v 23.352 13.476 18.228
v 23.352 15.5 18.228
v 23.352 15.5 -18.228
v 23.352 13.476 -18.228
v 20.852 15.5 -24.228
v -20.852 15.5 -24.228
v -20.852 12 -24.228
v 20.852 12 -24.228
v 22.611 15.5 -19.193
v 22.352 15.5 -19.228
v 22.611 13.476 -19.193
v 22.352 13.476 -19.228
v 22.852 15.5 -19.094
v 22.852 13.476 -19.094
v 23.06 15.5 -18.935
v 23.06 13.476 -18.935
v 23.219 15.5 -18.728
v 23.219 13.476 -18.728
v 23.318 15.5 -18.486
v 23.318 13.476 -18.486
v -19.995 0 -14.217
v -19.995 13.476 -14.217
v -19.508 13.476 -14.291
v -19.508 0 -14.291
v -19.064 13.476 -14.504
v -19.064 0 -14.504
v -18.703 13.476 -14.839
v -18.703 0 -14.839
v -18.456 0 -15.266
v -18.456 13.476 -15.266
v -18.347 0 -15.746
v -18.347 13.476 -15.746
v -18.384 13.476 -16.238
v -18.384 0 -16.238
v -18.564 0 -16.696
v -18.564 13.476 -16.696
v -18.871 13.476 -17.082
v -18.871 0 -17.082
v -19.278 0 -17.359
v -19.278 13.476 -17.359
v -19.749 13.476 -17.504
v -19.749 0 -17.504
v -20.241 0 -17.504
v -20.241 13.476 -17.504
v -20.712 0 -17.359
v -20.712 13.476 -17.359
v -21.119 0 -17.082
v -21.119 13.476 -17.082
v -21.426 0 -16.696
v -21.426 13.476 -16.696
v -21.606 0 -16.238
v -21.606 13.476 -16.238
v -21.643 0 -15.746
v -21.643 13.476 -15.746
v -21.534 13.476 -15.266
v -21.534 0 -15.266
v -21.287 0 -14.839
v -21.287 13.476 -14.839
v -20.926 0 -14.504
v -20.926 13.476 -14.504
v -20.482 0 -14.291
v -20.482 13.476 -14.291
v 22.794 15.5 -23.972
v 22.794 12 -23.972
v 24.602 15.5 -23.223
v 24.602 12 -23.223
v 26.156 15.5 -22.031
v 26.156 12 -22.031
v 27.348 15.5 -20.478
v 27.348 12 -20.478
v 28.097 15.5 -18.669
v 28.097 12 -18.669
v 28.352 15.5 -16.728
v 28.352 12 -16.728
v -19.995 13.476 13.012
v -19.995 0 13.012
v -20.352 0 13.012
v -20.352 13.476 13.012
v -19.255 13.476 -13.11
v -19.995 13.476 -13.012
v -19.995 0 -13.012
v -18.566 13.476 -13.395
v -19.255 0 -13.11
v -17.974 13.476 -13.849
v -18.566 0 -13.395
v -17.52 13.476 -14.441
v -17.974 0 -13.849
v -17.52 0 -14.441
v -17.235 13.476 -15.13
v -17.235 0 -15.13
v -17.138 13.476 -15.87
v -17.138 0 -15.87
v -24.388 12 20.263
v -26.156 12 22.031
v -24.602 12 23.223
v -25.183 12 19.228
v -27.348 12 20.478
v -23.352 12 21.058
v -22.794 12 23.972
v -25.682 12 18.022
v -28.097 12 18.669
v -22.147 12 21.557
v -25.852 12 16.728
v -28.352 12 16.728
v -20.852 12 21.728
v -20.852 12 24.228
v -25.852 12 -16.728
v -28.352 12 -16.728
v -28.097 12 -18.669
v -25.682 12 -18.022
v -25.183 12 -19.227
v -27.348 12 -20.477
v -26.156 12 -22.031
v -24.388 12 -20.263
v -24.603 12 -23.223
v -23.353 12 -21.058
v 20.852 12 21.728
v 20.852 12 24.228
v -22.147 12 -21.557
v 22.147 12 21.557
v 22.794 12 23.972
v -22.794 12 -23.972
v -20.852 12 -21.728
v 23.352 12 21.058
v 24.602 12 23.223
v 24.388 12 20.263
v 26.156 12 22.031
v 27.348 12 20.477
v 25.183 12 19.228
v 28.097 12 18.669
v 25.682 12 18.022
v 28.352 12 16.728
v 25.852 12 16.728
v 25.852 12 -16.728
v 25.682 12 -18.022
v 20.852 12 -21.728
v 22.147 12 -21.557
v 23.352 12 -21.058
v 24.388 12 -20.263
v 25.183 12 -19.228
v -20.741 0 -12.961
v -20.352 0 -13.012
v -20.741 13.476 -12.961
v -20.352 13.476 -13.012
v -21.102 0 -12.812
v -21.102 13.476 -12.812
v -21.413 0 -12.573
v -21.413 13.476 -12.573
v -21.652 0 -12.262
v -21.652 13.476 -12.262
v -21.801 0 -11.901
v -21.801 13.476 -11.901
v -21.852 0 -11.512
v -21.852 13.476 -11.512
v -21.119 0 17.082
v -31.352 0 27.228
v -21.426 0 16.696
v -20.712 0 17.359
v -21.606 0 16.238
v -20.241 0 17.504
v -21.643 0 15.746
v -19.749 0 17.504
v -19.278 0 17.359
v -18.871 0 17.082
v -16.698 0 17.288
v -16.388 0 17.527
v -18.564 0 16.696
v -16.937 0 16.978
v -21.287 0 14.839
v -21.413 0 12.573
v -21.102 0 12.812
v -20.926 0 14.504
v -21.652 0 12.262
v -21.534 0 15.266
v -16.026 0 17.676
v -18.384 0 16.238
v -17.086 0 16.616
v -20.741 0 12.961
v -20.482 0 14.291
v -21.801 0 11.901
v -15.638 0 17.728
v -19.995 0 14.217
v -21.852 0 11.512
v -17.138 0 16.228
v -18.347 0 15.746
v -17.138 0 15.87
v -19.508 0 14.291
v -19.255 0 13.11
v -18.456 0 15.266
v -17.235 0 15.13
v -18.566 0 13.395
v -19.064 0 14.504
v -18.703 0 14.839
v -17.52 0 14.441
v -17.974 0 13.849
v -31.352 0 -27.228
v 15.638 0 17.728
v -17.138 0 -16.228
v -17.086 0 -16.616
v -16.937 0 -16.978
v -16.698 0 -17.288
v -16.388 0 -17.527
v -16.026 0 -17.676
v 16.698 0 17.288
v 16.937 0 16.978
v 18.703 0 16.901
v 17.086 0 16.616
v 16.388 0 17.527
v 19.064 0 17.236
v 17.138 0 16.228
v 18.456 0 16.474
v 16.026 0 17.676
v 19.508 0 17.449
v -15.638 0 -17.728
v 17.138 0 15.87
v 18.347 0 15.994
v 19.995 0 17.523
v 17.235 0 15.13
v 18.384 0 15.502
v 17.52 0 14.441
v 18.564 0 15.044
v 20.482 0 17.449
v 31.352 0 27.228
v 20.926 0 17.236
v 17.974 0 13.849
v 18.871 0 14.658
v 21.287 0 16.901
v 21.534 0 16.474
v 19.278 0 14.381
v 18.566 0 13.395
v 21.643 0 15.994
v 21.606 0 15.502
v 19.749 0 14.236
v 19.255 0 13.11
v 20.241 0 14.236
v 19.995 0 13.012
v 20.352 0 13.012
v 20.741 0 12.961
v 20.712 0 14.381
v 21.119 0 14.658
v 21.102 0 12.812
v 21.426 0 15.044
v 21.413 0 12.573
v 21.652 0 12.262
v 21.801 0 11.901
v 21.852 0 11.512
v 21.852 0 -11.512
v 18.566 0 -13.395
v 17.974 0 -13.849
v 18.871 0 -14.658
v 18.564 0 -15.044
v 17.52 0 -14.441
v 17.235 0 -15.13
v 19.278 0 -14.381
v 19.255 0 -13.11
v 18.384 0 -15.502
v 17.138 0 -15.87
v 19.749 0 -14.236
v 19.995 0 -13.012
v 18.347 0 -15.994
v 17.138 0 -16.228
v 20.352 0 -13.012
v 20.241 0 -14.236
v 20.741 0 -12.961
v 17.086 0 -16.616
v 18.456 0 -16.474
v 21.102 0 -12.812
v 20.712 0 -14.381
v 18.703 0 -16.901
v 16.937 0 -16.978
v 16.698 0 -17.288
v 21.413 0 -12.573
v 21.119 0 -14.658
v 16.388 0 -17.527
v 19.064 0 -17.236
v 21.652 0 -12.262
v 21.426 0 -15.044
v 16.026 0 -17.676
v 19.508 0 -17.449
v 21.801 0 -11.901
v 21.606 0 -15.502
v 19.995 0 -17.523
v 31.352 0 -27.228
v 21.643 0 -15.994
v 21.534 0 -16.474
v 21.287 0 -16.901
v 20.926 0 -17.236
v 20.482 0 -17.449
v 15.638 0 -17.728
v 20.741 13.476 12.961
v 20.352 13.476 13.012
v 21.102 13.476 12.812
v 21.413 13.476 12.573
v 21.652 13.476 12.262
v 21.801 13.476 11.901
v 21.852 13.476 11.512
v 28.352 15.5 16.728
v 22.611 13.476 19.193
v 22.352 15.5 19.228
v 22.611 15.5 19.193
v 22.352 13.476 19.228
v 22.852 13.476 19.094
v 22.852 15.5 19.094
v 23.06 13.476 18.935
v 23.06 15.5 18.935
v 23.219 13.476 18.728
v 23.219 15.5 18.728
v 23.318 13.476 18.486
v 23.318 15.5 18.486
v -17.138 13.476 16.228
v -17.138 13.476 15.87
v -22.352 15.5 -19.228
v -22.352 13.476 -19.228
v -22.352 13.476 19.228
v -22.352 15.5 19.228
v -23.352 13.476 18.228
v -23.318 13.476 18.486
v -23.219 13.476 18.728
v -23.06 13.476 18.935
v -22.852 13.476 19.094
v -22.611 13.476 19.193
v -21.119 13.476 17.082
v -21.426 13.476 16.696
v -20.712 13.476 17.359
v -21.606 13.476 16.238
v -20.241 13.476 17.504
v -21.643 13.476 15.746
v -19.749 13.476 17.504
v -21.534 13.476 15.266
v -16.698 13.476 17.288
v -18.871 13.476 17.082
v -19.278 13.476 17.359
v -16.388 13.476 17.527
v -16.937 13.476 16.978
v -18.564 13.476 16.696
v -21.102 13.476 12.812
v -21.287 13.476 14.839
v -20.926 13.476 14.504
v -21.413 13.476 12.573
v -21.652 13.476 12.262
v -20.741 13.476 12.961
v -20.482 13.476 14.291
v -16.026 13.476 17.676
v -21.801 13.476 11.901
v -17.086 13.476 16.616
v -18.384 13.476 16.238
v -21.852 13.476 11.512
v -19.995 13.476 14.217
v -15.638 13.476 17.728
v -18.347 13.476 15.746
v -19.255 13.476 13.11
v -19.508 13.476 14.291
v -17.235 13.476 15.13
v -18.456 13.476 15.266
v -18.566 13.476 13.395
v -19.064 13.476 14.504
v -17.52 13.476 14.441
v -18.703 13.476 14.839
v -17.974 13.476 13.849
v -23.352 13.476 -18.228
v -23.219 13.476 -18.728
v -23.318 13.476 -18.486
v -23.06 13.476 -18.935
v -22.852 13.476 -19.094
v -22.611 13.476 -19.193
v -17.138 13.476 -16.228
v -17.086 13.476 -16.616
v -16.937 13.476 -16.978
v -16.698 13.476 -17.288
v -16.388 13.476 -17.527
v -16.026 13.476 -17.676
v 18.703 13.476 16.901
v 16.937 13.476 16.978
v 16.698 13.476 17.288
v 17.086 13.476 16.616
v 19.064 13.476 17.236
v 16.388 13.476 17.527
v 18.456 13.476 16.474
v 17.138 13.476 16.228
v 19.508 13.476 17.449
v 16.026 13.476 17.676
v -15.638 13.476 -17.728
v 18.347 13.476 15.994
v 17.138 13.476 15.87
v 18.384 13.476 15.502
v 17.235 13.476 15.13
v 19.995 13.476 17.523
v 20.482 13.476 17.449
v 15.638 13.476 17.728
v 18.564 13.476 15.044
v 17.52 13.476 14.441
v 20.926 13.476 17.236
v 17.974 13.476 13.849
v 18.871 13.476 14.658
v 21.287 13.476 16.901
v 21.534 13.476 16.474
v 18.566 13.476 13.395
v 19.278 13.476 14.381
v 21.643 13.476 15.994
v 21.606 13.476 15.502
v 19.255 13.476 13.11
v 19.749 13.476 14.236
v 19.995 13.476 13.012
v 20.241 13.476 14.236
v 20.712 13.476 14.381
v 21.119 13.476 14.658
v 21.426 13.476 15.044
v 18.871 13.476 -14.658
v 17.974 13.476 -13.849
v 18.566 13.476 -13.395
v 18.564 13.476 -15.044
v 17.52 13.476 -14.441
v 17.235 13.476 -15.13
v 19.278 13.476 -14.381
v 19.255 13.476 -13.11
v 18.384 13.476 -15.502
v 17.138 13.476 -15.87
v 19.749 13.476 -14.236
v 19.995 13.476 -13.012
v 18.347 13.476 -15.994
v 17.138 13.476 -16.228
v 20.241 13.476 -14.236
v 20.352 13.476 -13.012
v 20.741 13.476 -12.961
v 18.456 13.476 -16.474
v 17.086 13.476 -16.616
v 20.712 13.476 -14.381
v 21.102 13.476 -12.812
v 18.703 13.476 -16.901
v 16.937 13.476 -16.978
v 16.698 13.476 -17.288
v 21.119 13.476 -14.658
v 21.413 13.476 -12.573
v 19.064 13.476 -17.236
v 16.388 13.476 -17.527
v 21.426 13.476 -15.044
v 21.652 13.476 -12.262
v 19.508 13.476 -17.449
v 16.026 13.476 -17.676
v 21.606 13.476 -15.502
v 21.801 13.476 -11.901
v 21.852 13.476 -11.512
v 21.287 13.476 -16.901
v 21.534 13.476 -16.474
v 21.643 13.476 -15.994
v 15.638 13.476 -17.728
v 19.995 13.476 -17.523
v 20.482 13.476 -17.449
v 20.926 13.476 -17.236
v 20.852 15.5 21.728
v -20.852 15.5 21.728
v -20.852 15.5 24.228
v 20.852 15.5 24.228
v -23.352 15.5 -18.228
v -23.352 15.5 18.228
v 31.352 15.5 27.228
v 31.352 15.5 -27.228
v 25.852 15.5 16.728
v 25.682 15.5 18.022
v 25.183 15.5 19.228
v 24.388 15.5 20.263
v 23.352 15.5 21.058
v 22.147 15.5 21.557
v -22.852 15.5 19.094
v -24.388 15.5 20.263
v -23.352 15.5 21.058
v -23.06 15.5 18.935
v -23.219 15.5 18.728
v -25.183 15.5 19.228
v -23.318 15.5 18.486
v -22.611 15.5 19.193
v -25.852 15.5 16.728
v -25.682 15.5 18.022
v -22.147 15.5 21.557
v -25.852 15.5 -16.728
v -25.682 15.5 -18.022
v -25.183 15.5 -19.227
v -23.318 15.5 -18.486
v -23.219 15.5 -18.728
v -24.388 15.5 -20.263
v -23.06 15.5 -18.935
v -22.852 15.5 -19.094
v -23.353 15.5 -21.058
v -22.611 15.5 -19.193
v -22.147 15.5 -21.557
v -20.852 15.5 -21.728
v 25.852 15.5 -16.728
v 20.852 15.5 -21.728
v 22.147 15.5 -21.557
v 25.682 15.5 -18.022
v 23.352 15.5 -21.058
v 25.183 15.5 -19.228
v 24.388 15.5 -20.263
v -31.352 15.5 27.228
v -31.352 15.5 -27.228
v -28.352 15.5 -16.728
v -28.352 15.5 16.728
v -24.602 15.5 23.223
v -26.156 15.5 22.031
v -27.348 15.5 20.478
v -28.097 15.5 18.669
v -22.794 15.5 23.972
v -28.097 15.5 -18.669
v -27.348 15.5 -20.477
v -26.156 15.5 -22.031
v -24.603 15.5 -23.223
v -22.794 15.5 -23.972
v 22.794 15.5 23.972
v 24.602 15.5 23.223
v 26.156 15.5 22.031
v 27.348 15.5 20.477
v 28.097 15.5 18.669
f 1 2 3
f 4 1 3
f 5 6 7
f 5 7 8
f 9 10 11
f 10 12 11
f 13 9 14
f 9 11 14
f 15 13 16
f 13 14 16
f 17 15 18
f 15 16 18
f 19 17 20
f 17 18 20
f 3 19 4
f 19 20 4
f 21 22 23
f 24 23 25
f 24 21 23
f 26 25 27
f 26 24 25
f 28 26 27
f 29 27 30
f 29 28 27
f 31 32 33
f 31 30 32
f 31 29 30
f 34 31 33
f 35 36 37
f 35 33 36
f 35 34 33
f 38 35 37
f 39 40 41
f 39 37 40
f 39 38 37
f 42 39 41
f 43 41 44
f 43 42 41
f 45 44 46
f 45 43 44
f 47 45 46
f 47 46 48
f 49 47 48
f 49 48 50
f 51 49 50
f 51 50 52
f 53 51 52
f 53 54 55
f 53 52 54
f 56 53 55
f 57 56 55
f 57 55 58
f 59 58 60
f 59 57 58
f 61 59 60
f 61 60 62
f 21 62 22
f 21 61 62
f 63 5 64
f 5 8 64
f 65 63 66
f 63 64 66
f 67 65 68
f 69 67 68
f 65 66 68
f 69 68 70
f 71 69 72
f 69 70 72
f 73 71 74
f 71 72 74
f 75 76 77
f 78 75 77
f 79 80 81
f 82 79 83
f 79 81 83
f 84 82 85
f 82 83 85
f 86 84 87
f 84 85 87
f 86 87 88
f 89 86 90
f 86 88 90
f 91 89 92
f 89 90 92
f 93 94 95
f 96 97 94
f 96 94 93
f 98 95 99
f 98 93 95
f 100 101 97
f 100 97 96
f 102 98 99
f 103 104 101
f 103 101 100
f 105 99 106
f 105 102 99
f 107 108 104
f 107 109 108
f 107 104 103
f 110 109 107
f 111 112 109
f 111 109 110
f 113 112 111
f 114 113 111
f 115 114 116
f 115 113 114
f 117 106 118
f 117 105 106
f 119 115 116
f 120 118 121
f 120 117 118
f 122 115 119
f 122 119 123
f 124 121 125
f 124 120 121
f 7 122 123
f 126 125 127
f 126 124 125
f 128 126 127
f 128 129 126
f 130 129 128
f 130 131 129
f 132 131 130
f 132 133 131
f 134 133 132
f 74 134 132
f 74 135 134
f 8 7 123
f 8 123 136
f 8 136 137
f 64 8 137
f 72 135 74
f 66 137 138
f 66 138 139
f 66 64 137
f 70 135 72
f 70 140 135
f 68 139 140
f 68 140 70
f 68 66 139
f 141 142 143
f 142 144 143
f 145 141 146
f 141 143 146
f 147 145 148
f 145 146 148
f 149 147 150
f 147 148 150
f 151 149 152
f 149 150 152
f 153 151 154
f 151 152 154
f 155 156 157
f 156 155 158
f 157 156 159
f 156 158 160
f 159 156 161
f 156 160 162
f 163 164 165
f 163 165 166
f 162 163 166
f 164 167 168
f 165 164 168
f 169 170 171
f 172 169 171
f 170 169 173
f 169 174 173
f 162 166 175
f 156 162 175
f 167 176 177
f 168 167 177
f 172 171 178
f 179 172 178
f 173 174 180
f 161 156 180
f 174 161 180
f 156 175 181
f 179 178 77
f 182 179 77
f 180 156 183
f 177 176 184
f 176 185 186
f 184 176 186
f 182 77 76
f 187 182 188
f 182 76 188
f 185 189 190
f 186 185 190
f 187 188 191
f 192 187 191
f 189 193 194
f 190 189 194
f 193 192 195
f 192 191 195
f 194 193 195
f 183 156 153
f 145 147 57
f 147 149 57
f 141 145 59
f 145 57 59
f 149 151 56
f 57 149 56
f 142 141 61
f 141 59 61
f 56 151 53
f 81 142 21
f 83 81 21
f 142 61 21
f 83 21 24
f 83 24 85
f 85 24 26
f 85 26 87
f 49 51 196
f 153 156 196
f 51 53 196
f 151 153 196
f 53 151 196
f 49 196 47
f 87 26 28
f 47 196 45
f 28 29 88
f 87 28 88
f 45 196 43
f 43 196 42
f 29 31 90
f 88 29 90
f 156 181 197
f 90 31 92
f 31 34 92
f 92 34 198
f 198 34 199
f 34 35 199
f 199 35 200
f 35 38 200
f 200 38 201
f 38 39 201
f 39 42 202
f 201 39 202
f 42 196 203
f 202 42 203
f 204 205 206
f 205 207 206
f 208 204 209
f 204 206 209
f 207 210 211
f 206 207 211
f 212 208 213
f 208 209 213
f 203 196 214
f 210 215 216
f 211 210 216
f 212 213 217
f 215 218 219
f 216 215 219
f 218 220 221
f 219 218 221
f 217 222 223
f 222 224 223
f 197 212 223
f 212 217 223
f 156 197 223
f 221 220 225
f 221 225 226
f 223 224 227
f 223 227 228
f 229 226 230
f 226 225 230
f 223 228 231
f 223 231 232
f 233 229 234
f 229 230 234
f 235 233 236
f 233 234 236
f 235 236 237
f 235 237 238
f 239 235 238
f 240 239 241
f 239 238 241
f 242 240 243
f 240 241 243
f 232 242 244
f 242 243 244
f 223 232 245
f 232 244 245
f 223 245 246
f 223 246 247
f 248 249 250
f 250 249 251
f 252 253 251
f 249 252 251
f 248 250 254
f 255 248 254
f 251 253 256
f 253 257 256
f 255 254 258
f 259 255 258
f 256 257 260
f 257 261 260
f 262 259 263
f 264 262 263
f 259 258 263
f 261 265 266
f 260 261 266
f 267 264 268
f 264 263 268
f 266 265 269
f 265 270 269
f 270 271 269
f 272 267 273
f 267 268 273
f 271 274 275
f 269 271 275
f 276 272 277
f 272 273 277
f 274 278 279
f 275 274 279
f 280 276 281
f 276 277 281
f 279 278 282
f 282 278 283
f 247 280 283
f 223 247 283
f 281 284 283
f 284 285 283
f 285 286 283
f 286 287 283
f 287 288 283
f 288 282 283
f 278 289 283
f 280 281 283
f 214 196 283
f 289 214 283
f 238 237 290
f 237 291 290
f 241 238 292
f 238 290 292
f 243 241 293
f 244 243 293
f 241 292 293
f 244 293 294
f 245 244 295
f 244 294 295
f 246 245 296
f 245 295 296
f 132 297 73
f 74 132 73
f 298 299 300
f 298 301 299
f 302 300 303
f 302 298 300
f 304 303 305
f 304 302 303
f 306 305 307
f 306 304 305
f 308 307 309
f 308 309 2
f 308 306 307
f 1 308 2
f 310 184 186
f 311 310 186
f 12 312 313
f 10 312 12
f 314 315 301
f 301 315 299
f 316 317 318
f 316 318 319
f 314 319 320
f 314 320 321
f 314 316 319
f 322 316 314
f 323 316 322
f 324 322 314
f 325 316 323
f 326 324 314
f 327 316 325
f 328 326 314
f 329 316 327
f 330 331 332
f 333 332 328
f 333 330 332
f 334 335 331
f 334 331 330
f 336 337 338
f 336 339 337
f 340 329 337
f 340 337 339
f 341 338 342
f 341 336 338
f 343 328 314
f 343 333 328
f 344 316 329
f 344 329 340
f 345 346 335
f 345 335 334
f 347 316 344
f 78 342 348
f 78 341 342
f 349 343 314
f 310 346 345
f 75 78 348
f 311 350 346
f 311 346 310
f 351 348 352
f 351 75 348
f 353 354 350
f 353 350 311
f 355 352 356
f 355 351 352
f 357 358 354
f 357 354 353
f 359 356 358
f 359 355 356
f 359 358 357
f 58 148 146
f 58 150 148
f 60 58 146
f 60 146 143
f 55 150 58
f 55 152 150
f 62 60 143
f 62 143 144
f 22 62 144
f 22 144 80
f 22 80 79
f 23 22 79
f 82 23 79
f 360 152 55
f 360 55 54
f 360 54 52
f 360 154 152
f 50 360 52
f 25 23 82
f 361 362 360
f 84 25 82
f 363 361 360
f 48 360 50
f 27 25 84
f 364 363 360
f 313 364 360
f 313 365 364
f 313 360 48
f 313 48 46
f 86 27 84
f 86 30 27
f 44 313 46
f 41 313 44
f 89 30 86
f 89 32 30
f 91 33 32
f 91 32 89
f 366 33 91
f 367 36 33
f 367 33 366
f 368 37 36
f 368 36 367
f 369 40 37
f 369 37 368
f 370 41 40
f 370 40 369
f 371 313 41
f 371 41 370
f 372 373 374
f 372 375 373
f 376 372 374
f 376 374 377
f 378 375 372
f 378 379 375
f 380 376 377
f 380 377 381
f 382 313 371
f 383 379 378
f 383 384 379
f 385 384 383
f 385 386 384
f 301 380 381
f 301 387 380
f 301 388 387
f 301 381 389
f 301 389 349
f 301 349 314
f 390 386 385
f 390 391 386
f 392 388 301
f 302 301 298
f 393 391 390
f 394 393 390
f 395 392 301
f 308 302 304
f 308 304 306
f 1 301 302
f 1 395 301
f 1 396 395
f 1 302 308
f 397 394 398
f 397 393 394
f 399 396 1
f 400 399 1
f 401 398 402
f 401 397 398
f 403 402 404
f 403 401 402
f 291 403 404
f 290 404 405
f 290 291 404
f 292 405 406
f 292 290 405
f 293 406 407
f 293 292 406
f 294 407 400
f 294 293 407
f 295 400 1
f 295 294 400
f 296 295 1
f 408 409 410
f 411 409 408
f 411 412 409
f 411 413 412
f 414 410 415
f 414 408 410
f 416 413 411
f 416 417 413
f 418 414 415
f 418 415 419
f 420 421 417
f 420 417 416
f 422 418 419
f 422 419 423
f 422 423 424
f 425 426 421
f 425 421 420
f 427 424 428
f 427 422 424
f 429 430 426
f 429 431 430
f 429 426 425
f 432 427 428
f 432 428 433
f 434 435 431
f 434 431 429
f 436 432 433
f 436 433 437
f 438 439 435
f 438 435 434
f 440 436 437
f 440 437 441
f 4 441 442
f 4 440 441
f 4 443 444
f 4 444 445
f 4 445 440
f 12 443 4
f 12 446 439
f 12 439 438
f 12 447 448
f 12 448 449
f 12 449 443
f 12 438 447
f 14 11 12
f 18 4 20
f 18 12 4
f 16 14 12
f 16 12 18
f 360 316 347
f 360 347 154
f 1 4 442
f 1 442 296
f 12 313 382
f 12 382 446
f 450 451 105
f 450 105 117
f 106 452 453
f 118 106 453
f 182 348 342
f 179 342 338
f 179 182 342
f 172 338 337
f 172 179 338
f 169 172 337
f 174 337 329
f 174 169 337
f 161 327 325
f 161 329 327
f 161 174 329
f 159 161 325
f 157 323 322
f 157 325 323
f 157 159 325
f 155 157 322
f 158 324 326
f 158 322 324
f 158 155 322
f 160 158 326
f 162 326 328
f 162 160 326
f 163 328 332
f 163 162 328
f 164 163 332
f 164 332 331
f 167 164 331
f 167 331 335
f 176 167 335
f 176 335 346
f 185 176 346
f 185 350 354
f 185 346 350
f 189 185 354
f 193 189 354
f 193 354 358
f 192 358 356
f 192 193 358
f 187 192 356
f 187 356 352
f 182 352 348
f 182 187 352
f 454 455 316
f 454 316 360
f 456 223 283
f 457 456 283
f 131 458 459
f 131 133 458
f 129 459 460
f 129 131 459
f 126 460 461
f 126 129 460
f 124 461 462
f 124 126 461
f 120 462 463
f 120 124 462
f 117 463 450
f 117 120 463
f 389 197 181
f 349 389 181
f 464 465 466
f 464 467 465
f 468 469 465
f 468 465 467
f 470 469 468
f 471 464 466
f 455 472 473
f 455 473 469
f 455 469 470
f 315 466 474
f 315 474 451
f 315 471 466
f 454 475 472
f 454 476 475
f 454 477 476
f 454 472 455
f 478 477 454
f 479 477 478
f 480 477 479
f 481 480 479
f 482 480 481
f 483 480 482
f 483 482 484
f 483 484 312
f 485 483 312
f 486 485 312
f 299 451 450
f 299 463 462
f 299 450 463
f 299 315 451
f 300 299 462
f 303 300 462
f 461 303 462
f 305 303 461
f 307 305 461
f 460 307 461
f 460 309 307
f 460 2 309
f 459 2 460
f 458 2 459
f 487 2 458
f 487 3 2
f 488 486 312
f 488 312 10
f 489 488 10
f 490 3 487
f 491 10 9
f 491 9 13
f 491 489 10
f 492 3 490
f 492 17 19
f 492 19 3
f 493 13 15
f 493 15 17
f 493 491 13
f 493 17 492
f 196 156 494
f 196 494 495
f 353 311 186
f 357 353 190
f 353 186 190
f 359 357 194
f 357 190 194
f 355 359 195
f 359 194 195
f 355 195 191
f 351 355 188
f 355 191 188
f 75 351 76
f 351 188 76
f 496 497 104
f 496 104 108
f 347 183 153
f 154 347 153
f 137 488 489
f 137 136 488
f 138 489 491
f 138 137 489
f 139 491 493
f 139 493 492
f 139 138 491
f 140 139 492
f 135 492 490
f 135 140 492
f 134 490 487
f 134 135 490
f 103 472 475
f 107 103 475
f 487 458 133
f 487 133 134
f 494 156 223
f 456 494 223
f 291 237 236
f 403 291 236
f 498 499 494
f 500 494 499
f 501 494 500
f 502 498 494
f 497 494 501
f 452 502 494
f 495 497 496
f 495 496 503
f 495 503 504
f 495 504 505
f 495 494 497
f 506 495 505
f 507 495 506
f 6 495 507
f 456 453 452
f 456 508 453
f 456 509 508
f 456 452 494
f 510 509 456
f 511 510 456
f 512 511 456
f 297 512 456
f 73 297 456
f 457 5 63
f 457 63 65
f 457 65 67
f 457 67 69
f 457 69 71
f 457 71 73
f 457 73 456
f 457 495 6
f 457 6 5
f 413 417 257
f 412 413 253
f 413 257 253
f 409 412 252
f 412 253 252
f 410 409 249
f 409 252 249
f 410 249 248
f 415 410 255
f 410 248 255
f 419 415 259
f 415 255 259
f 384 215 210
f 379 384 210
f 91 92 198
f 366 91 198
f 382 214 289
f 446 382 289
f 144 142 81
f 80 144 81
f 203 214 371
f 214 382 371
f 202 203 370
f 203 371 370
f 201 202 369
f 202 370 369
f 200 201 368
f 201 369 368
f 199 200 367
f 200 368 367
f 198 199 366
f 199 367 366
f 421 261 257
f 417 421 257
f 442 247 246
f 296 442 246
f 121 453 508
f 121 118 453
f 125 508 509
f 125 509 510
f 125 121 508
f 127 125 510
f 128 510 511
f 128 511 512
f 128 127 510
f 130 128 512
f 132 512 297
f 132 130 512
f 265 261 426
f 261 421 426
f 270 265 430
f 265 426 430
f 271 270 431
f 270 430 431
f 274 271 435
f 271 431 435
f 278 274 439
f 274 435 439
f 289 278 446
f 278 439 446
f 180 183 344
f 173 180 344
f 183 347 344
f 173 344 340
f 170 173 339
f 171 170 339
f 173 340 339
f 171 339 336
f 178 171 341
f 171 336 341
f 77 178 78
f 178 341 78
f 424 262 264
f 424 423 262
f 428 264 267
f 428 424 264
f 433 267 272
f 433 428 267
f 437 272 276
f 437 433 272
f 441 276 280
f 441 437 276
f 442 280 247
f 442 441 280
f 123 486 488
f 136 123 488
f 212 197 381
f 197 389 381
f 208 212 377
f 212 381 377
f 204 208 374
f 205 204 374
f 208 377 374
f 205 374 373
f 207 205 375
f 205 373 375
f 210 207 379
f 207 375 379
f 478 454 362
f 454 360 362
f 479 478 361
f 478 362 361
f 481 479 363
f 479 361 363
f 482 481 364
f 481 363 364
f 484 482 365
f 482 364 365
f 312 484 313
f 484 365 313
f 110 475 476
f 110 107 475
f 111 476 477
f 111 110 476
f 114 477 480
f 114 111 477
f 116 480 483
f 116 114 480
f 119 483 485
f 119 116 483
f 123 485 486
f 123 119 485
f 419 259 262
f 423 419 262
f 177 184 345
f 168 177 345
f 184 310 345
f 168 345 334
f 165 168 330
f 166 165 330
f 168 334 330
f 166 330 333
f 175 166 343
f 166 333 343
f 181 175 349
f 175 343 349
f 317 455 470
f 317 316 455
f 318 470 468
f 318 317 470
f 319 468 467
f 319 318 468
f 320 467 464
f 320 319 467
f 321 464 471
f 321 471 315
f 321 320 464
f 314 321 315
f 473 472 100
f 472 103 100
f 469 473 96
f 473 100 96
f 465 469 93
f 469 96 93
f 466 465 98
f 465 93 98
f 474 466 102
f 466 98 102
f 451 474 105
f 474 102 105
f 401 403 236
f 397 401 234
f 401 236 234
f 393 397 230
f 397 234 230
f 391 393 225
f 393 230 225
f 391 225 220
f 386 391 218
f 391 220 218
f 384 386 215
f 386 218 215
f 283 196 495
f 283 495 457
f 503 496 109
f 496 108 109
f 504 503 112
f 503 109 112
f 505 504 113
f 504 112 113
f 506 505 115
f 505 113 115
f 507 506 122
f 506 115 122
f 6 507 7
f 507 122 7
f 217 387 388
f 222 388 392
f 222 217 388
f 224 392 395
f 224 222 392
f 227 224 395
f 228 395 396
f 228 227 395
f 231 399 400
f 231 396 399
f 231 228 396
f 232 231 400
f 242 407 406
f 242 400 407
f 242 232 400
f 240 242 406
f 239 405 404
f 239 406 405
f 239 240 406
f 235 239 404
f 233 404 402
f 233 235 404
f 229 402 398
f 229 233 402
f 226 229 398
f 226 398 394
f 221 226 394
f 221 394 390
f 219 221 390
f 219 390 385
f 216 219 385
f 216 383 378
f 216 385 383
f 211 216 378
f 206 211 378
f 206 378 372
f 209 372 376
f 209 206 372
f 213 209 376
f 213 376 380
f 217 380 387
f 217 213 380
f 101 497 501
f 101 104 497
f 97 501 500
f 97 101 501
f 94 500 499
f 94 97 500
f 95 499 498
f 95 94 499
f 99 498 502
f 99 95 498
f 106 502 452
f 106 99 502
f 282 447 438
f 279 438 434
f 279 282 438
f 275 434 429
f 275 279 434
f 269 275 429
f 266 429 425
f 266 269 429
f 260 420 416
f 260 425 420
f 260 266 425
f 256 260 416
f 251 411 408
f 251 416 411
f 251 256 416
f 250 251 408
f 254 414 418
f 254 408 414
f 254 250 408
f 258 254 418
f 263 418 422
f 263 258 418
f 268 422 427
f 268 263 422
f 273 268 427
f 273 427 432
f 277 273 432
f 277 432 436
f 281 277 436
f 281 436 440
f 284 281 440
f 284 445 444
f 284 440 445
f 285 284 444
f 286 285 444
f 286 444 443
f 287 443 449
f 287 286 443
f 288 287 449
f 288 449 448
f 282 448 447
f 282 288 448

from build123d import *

# Parameters (mm, degrees)
SKETCH1_W           = 62.705
SKETCH1_H           = 54.455
SKETCH1_R           = 1.65288
BOSS_EXTRUDE1_DEPTH = 15.5
SKETCH2_W           = 46.705
SKETCH2_H           = 38.455
CUT_EXTRUDE1_DEPTH  = 2.024
FILLET2_R           = 1.5
SKETCH3_W           = 56.705
SKETCH3_H           = 48.455
SKETCH3_W_2         = 51.705
SKETCH3_H_2         = 43.455
CUT_EXTRUDE2_DEPTH  = 3.5
FILLET3_R           = 1
FILLET4_R           = 5
FILLET5_R           = 7.5


with BuildPart() as part:
    # Sketch1 → Boss-Extrude1 (new body)
    with BuildSketch(Plane(origin=(0, 0, 0), x_dir=(1, 0, 0), z_dir=(0, 1, 0))):
        Rectangle(SKETCH1_W, SKETCH1_H)
        with Locations(Location((-19.995, 15.87, 0), (0, 0, 270))):
            Circle(SKETCH1_R, mode=Mode.SUBTRACT)
        with Locations(Location((19.995, 15.87, 0), (0, 0, 90))):
            Circle(SKETCH1_R, mode=Mode.SUBTRACT)
        with Locations(Location((19.995, -15.87, 0), (0, 0, 270))):
            Circle(SKETCH1_R, mode=Mode.SUBTRACT)
        with Locations(Location((-19.995, -15.87, 0), (0, 0, 90))):
            Circle(SKETCH1_R, mode=Mode.SUBTRACT)
        with BuildLine():
            Line((21.8525, 13.0125), (21.8525, -13.0125))
            Line((21.8525, -13.0125), (19.995, -13.0125))
            ThreePointArc((19.995, -13.0125), (17.974442373, -13.849442373), (17.1375, -15.87))
            Line((17.1375, -15.87), (17.1375, -17.7275))
            Line((17.1375, -17.7275), (-17.1375, -17.7275))
            Line((-17.1375, -17.7275), (-17.1375, -15.87))
            ThreePointArc((-17.1375, -15.87), (-17.974442373, -13.849442373), (-19.995, -13.0125))
            Line((-19.995, -13.0125), (-21.8525, -13.0125))
            Line((-21.8525, -13.0125), (-21.8525, 13.0125))
            Line((-21.8525, 13.0125), (-19.995, 13.0125))
            ThreePointArc((-19.995, 13.0125), (-17.974442373, 13.849442373), (-17.1375, 15.87))
            Line((-17.1375, 15.87), (-17.1375, 17.7275))
            Line((-17.1375, 17.7275), (17.1375, 17.7275))
            Line((17.1375, 17.7275), (17.1375, 15.87))
            ThreePointArc((17.1375, 15.87), (17.974442373, 13.849442373), (19.995, 13.0125))
            Line((19.995, 13.0125), (21.8525, 13.0125))
        make_face(mode=Mode.SUBTRACT)
    extrude(amount=BOSS_EXTRUDE1_DEPTH)

    # Sketch2 → Cut-Extrude1 (cut)
    with BuildSketch(Plane(origin=(0, 15.5, 0), x_dir=(1, 0, 0), z_dir=(0, 1, 0))):
        Rectangle(SKETCH2_W, SKETCH2_H)
    extrude(amount=-CUT_EXTRUDE1_DEPTH, mode=Mode.SUBTRACT)

    # Fillet2
    fillet2_edges = [part.edges().sort_by_distance(p)[0] for p in [
        (21.8525, 6.738, -13.0125),
        (21.8525, 6.738, 13.0125),
        (17.1375, 6.738, 17.7275),
        (-17.1375, 6.738, 17.7275),
        (-21.8525, 6.738, 13.0125),
        (-21.8525, 6.738, -13.0125),
        (-17.1375, 6.738, -17.7275),
        (17.1375, 6.738, -17.7275),
    ]]
    fillet(fillet2_edges, radius=FILLET2_R)

    # Sketch3 → Cut-Extrude2 (cut)
    with BuildSketch(Plane(origin=(0, 15.5, 0), x_dir=(1, 0, 0), z_dir=(0, 1, 0))):
        Rectangle(SKETCH3_W, SKETCH3_H)
        Rectangle(SKETCH3_W_2, SKETCH3_H_2, mode=Mode.SUBTRACT)
    extrude(amount=-CUT_EXTRUDE2_DEPTH, mode=Mode.SUBTRACT)

    # Fillet3
    fillet3_edges = [part.edges().sort_by_distance(p)[0] for p in [
        (-23.3525, 14.488, 19.2275),
        (-23.3525, 14.488, -19.2275),
        (23.3525, 14.488, -19.2275),
        (23.3525, 14.488, 19.2275),
    ]]
    fillet(fillet3_edges, radius=FILLET3_R)

    # Fillet4
    fillet4_edges = [part.edges().sort_by_distance(p)[0] for p in [
        (-25.8525, 13.75, 21.7275),
        (-25.8525, 13.75, -21.7275),
        (25.8525, 13.75, -21.7275),
        (25.8525, 13.75, 21.7275),
    ]]
    fillet(fillet4_edges, radius=FILLET4_R)

    # Fillet5
    fillet5_edges = [part.edges().sort_by_distance(p)[0] for p in [
        (-28.3525, 13.75, 24.2275),
        (-28.3525, 13.75, -24.2275),
        (28.3525, 13.75, -24.2275),
        (28.3525, 13.75, 24.2275),
    ]]
    fillet(fillet5_edges, radius=FILLET5_R)


solid = part.part
